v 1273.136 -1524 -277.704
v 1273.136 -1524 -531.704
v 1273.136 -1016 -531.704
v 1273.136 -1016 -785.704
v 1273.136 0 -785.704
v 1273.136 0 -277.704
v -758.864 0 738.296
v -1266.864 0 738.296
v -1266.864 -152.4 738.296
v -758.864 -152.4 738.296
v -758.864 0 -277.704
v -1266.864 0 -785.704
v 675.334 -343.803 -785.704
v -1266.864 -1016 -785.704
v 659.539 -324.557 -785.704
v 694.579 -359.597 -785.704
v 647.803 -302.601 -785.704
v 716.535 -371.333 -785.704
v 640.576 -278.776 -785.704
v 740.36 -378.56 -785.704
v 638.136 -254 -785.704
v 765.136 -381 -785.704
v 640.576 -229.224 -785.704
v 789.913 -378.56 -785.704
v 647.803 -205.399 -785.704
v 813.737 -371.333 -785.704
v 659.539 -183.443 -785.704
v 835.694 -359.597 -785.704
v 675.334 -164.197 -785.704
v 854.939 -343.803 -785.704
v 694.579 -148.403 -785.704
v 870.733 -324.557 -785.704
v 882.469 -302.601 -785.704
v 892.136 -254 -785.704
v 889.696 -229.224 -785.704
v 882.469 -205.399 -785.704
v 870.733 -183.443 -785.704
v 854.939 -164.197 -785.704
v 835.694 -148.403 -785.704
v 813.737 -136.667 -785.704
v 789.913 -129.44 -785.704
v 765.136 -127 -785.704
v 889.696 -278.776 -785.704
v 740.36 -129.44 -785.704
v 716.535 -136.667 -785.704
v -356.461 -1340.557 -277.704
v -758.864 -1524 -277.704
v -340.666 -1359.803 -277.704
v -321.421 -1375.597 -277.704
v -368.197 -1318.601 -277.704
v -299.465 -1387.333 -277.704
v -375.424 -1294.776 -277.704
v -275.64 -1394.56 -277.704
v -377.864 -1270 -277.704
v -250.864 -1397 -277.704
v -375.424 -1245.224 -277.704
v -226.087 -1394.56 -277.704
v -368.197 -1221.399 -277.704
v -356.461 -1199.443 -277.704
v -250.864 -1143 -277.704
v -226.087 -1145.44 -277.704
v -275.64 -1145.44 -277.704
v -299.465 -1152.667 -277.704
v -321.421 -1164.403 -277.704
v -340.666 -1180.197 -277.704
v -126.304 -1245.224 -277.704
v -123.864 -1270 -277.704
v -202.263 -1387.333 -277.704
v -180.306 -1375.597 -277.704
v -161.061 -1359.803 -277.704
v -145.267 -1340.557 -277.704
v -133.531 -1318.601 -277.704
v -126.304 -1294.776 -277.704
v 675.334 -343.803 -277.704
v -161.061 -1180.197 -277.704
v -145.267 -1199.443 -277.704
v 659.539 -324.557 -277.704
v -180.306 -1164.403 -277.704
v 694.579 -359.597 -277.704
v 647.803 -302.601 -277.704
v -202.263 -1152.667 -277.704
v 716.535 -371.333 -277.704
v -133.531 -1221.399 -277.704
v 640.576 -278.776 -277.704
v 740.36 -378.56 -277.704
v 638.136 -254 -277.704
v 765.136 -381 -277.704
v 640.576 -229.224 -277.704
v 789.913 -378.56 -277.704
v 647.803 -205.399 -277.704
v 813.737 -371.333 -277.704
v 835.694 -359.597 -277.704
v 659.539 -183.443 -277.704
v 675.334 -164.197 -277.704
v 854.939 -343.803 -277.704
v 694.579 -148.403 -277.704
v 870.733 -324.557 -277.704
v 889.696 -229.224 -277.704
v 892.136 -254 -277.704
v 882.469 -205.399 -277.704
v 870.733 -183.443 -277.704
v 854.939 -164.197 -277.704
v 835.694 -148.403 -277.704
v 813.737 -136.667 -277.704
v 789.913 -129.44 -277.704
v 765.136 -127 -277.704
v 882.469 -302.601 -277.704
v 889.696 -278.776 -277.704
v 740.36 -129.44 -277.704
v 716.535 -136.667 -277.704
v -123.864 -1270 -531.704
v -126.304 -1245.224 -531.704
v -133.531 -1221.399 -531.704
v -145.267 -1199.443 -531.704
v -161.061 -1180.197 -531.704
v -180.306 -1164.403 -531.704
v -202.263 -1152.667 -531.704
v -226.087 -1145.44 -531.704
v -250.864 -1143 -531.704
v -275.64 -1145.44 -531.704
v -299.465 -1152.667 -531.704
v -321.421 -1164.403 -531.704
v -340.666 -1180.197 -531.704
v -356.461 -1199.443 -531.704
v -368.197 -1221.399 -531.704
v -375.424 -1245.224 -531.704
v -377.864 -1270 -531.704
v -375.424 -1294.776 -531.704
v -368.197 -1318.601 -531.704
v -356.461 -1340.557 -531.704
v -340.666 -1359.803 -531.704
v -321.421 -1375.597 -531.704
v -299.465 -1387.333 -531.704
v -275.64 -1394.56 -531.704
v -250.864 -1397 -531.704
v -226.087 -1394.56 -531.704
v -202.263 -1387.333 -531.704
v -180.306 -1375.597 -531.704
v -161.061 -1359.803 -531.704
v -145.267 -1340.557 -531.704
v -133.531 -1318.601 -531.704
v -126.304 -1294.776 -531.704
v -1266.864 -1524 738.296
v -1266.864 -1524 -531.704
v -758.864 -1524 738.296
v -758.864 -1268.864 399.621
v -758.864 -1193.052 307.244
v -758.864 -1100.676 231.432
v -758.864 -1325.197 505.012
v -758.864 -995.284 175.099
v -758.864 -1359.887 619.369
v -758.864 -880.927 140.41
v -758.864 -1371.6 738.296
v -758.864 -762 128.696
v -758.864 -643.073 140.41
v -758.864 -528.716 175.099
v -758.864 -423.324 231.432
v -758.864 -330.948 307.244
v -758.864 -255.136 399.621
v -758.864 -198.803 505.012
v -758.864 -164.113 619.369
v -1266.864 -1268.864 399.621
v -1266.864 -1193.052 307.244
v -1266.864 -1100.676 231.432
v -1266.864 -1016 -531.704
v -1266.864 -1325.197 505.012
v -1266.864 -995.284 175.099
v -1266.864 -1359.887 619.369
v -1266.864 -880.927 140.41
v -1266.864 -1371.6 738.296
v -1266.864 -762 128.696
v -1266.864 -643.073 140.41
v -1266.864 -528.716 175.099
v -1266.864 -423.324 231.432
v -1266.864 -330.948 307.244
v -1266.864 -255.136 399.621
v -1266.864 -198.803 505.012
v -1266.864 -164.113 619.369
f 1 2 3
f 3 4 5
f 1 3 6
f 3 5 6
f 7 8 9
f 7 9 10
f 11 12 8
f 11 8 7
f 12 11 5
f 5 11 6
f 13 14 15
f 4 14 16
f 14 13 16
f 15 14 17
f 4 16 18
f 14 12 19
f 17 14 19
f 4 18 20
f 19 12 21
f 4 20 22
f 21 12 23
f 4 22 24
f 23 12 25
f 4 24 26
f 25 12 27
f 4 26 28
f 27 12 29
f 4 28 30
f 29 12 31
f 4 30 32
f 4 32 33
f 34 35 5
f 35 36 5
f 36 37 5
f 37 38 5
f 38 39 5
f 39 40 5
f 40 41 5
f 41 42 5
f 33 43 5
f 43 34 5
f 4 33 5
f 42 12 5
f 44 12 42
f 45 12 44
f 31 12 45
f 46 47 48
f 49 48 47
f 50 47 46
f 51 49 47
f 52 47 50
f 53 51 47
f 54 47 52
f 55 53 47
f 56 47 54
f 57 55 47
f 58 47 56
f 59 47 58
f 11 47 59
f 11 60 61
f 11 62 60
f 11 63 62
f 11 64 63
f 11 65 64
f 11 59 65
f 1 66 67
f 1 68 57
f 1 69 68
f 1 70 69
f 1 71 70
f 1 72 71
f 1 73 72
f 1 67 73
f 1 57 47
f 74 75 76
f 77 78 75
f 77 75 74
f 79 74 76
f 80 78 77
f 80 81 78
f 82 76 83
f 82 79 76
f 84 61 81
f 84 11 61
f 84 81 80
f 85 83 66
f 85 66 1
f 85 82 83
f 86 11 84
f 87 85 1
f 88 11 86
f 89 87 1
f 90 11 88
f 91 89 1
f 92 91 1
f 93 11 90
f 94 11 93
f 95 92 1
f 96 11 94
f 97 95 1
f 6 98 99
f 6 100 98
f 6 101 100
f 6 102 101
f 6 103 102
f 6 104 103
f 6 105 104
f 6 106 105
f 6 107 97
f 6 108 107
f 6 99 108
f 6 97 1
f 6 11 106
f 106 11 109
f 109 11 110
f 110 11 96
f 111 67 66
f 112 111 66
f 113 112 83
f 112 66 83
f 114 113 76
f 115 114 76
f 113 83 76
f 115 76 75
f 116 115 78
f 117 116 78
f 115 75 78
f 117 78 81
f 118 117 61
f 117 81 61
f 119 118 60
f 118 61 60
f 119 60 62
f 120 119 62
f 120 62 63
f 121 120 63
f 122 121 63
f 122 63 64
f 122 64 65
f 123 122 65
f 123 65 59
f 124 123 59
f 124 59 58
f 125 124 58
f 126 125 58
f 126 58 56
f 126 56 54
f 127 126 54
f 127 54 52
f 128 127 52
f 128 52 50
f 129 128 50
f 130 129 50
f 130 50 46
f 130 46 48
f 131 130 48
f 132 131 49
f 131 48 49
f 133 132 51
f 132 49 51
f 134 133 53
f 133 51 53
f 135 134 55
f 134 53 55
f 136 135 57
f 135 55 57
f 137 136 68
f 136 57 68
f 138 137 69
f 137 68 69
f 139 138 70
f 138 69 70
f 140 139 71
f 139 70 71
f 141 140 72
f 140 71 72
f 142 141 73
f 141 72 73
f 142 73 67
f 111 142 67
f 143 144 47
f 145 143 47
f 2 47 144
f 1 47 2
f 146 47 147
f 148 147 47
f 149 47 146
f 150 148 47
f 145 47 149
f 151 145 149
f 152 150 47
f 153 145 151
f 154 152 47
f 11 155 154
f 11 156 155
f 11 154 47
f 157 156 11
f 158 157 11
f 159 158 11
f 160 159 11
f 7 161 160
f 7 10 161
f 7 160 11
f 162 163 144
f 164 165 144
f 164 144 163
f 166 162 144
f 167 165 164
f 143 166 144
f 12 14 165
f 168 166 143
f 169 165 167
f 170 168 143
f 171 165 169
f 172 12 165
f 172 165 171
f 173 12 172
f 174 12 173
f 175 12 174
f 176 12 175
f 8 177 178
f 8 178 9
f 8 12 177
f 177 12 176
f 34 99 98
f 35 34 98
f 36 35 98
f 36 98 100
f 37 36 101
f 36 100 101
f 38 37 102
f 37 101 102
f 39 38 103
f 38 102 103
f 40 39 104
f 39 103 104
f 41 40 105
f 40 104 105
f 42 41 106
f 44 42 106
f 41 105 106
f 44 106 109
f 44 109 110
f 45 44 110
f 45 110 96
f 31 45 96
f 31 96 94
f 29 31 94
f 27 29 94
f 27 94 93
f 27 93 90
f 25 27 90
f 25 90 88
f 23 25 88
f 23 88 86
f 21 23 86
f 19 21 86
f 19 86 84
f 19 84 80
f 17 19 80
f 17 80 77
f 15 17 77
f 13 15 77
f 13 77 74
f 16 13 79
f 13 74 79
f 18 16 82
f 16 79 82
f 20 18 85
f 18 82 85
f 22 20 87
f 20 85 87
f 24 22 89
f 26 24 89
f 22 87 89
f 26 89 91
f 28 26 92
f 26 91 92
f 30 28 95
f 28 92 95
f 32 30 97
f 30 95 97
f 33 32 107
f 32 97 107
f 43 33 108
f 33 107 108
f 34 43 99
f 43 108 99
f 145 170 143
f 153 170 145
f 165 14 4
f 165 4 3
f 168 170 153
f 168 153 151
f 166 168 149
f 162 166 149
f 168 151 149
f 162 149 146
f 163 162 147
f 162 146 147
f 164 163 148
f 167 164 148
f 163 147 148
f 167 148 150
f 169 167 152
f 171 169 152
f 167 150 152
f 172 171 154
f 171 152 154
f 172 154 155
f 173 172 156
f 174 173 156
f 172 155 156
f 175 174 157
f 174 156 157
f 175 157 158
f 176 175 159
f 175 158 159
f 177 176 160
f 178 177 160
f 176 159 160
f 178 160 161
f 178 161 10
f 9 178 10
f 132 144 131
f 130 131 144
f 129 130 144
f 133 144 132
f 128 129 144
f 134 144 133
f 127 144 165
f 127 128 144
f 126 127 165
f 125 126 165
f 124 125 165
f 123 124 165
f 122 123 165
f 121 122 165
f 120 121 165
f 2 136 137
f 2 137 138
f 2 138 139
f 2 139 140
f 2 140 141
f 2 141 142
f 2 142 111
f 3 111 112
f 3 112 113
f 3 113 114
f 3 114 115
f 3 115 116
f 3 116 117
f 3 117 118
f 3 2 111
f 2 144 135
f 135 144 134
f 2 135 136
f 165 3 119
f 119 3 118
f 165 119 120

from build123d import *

# Parameters (mm, degrees)
F0_W      = 2540
F0_H      = 1524
F1_DEPTH  = 1524
F2_W      = 2500.7290350051
F2_H      = 1991.9227032241
F3_DEPTH  = 1016
F4_W      = 671.5307240188
F4_H      = 361.5935033129
F5_DEPTH  = 2540.001
F6_R      = 609.6
F7_DEPTH  = 508.001
F8_R      = 127
F9_DEPTH  = 508.001
F10_R     = 127
F11_DEPTH = 508.001


with BuildPart() as f1:
    # F0 (on Front) → F1 (new body)
    with BuildSketch(Plane.XZ):
        with Locations((3.1360983849, -23.7037387643)):
            Rectangle(F0_W, F0_H)
    extrude(amount=F1_DEPTH)

    # F2 (on face) → F3 (cut)
    with BuildSketch(Plane.XY.offset(738.2962612357)):
        with Locations((491.5006158874, -797.8574298322)):
            Rectangle(F2_W, F2_H)
    extrude(amount=-F3_DEPTH, mode=Mode.SUBTRACT)

    # F4 (on face) → F5 (cut, through all)
    with BuildSketch(Plane.YZ.offset(1273.1360983849)):
        with Locations((-1351.7653620094, -712.5004904208)):
            Rectangle(F4_W, F4_H)
    extrude(amount=-F5_DEPTH, mode=Mode.SUBTRACT)

    # F6 (on face) → F7 (cut, through all)
    with BuildSketch(Plane.YZ.offset(-758.8639016151)):
        with Locations((-762, 738.2962612357)):
            Circle(F6_R)
    extrude(amount=-F7_DEPTH, mode=Mode.SUBTRACT)

    # F8 (on face) → F9 (cut, through all)
    with BuildSketch(Plane.XY.offset(-277.7037387643)):
        with Locations((765.1360983849, -254)):
            Circle(F8_R)
    extrude(amount=-F9_DEPTH, mode=Mode.SUBTRACT)

    # F10 (on face) → F11 (cut, through all)
    with BuildSketch(Plane.XY.offset(-277.7037387643)):
        with Locations((-250.8639016151, -1270)):
            Circle(F10_R)
    extrude(amount=-F11_DEPTH, mode=Mode.SUBTRACT)


solid = f1.part
